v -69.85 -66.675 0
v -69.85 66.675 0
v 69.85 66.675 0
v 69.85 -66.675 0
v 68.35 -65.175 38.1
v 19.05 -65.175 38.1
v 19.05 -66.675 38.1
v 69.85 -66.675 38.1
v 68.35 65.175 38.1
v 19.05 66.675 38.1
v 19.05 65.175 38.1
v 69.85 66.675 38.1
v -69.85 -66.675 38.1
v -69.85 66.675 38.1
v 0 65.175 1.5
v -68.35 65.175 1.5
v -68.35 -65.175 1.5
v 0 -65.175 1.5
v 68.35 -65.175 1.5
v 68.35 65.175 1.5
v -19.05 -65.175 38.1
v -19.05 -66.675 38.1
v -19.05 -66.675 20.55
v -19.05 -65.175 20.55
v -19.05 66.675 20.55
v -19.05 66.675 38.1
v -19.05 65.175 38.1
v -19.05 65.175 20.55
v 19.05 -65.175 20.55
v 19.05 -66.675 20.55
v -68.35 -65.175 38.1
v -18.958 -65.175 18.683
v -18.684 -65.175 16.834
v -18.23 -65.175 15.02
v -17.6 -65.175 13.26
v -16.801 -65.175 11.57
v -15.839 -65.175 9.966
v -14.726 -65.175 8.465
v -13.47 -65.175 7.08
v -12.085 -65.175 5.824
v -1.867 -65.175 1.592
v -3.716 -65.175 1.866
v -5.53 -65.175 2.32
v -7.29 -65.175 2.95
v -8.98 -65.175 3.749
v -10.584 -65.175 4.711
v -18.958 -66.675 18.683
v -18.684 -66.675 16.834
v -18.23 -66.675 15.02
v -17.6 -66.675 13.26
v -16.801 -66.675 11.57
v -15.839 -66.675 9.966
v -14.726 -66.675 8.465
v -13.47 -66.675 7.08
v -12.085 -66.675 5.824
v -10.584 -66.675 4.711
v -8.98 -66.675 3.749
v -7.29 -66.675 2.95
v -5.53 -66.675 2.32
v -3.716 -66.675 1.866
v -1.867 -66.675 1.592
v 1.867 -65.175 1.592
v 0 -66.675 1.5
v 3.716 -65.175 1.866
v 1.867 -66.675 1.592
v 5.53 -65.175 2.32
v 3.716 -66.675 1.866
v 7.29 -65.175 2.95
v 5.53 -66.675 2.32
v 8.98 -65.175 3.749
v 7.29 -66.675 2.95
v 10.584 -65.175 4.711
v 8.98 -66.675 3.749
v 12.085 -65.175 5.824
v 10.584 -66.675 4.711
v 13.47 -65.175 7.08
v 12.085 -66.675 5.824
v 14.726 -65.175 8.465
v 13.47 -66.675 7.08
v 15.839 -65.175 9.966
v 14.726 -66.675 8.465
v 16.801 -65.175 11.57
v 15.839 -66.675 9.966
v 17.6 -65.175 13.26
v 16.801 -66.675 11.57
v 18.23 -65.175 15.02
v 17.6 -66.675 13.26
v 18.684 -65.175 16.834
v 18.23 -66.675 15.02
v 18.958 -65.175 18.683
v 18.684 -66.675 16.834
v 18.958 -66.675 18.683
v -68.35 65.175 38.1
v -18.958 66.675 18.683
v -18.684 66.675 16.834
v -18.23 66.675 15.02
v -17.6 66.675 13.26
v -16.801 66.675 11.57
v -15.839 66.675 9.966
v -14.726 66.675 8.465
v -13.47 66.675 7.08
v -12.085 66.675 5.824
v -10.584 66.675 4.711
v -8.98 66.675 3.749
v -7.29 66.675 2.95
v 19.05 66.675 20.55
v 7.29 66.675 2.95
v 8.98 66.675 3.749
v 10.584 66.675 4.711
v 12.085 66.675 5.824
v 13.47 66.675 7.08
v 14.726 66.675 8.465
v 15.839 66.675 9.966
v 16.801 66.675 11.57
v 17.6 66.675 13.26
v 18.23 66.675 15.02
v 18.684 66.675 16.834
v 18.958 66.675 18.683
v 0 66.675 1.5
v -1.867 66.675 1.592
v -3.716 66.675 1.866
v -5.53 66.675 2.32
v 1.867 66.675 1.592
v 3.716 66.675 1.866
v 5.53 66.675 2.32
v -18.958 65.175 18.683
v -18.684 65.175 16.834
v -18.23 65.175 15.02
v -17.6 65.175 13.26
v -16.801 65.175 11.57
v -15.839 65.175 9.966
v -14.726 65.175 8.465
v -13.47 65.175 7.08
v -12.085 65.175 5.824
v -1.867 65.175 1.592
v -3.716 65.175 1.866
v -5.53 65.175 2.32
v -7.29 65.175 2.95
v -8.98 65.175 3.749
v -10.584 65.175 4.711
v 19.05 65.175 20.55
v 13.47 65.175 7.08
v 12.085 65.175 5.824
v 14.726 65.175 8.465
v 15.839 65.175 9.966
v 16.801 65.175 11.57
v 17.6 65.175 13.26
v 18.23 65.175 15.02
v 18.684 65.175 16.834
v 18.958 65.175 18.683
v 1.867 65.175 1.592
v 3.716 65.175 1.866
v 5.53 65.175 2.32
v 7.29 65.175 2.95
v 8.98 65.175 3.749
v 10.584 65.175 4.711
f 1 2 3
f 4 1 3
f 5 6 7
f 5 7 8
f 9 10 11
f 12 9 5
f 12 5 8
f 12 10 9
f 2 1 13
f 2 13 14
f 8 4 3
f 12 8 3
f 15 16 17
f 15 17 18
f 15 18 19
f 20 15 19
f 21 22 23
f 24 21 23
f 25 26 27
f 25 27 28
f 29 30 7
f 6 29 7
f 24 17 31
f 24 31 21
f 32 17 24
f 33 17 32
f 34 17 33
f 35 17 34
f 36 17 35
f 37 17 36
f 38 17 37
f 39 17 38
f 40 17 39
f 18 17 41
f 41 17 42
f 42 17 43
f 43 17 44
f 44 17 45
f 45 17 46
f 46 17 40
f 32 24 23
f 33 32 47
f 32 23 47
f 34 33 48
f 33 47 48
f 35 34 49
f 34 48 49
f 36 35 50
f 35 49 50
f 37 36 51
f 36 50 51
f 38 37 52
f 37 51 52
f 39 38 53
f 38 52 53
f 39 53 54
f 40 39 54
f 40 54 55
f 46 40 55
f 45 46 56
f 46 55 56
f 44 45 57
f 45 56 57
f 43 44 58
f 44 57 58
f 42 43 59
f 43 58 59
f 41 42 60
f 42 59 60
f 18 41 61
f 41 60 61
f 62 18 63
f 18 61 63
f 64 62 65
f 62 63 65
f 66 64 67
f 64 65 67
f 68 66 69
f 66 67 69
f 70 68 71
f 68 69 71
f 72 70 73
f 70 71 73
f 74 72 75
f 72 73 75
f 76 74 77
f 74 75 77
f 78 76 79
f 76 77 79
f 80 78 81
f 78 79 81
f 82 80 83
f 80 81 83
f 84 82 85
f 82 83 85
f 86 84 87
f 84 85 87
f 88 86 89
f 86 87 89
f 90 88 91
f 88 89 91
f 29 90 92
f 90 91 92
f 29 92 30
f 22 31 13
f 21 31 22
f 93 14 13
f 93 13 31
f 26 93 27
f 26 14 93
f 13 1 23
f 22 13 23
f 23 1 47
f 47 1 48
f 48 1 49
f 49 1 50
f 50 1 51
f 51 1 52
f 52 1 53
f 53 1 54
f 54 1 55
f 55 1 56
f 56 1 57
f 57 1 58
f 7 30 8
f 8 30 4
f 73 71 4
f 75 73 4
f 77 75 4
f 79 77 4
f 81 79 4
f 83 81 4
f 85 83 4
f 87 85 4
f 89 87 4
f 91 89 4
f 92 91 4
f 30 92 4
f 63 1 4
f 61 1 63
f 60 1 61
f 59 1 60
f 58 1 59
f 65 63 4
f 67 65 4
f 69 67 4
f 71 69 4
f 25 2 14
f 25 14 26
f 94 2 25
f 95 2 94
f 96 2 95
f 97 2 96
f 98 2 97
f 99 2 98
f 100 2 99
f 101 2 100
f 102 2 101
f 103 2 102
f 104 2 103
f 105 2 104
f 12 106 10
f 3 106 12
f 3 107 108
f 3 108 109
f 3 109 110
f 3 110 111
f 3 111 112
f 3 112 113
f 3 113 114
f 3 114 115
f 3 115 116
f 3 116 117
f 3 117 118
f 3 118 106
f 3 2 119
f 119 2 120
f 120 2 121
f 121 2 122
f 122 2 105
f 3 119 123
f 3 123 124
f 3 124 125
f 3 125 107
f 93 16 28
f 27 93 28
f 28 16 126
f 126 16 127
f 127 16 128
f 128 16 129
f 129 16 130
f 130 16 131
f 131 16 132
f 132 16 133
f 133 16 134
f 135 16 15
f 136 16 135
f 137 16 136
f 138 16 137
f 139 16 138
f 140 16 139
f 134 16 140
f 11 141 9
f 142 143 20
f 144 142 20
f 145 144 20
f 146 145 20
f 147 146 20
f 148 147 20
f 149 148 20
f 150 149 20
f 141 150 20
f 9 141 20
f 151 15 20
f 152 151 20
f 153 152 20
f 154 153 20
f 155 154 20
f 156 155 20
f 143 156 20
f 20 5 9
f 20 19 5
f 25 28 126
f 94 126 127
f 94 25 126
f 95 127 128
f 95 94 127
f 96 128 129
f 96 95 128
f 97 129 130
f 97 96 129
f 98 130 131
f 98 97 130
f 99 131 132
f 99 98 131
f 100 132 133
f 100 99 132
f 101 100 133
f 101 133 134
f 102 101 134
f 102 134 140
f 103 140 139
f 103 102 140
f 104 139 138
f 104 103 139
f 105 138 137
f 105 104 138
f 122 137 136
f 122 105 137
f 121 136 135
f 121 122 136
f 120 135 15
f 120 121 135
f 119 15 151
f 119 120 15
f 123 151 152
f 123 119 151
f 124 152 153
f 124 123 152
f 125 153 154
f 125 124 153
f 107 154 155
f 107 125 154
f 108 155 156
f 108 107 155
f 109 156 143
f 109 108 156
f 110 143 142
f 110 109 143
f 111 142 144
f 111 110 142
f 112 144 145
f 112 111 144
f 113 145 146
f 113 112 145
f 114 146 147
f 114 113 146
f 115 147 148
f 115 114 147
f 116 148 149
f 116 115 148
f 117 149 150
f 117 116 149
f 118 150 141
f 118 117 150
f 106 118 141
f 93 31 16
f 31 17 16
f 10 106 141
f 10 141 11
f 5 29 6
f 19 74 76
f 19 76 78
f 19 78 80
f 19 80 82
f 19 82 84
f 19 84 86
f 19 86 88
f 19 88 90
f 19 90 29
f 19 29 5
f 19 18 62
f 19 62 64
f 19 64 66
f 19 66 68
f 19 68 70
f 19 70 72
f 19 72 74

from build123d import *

# Parameters (mm, degrees)
F0_W     = 139.7
F0_H     = 133.35
F1_DEPTH = 38.1
F2_T     = -1.5
F4_DEPTH = 1.5


# Not quite as in the source:
# - a pattern or mirror of a feature is missing from the dataset's text; its kind, count and spacing are read off the source's solid


with BuildPart() as f1:
    # F0 (on Top) → F1 (new body)
    with BuildSketch(Plane.XY):
        Rectangle(F0_W, F0_H)
    extrude(amount=F1_DEPTH)

    # F2
    f2_openings = [f1.faces().sort_by_distance(p)[0] for p in [
        (0, 0, 38.1),
    ]]
    offset(amount=F2_T, openings=f2_openings)

    # F3 (on face) → F4 (cut)
    with BuildSketch(Plane.XZ.offset(66.675)):
        with BuildLine():
            Line((19.05, 20.55), (-19.05, 20.55))
            ThreePointArc((-19.05, 20.55), (0, 1.5), (19.05, 20.55))
        make_face()
        with BuildLine():
            Line((-19.05, 38.1), (-19.05, 20.55))
            ThreePointArc((-19.05, 20.55), (-15.8753360228, 31.0797771184), (-7.4094534211, 38.1))
            Line((-7.4094534211, 38.1), (-19.05, 38.1))
        make_face()
        with BuildLine():
            ThreePointArc((-7.4094534211, 38.1), (-15.8753360228, 31.0797771184), (-19.05, 20.55))
            Line((-19.05, 20.55), (19.05, 20.55))
            ThreePointArc((19.05, 20.55), (15.8753360228, 31.0797771184), (7.4094534211, 38.1))
            Line((7.4094534211, 38.1), (-7.4094534211, 38.1))
        make_face()
        with BuildLine():
            ThreePointArc((7.4094534211, 38.1), (15.8753360228, 31.0797771184), (19.05, 20.55))
            Line((19.05, 20.55), (19.05, 38.1))
            Line((19.05, 38.1), (7.4094534211, 38.1))
        make_face()
        with BuildLine():
            ThreePointArc((7.4094534211, 38.1), (0, 39.6), (-7.4094534211, 38.1))
            Line((-7.4094534211, 38.1), (7.4094534211, 38.1))
        make_face()
    f4 = extrude(amount=-F4_DEPTH, mode=Mode.SUBTRACT)

    # F4_copies: F4 across plane
    add(f4.mirror(Plane.ZX), mode=Mode.SUBTRACT)


solid = f1.part
